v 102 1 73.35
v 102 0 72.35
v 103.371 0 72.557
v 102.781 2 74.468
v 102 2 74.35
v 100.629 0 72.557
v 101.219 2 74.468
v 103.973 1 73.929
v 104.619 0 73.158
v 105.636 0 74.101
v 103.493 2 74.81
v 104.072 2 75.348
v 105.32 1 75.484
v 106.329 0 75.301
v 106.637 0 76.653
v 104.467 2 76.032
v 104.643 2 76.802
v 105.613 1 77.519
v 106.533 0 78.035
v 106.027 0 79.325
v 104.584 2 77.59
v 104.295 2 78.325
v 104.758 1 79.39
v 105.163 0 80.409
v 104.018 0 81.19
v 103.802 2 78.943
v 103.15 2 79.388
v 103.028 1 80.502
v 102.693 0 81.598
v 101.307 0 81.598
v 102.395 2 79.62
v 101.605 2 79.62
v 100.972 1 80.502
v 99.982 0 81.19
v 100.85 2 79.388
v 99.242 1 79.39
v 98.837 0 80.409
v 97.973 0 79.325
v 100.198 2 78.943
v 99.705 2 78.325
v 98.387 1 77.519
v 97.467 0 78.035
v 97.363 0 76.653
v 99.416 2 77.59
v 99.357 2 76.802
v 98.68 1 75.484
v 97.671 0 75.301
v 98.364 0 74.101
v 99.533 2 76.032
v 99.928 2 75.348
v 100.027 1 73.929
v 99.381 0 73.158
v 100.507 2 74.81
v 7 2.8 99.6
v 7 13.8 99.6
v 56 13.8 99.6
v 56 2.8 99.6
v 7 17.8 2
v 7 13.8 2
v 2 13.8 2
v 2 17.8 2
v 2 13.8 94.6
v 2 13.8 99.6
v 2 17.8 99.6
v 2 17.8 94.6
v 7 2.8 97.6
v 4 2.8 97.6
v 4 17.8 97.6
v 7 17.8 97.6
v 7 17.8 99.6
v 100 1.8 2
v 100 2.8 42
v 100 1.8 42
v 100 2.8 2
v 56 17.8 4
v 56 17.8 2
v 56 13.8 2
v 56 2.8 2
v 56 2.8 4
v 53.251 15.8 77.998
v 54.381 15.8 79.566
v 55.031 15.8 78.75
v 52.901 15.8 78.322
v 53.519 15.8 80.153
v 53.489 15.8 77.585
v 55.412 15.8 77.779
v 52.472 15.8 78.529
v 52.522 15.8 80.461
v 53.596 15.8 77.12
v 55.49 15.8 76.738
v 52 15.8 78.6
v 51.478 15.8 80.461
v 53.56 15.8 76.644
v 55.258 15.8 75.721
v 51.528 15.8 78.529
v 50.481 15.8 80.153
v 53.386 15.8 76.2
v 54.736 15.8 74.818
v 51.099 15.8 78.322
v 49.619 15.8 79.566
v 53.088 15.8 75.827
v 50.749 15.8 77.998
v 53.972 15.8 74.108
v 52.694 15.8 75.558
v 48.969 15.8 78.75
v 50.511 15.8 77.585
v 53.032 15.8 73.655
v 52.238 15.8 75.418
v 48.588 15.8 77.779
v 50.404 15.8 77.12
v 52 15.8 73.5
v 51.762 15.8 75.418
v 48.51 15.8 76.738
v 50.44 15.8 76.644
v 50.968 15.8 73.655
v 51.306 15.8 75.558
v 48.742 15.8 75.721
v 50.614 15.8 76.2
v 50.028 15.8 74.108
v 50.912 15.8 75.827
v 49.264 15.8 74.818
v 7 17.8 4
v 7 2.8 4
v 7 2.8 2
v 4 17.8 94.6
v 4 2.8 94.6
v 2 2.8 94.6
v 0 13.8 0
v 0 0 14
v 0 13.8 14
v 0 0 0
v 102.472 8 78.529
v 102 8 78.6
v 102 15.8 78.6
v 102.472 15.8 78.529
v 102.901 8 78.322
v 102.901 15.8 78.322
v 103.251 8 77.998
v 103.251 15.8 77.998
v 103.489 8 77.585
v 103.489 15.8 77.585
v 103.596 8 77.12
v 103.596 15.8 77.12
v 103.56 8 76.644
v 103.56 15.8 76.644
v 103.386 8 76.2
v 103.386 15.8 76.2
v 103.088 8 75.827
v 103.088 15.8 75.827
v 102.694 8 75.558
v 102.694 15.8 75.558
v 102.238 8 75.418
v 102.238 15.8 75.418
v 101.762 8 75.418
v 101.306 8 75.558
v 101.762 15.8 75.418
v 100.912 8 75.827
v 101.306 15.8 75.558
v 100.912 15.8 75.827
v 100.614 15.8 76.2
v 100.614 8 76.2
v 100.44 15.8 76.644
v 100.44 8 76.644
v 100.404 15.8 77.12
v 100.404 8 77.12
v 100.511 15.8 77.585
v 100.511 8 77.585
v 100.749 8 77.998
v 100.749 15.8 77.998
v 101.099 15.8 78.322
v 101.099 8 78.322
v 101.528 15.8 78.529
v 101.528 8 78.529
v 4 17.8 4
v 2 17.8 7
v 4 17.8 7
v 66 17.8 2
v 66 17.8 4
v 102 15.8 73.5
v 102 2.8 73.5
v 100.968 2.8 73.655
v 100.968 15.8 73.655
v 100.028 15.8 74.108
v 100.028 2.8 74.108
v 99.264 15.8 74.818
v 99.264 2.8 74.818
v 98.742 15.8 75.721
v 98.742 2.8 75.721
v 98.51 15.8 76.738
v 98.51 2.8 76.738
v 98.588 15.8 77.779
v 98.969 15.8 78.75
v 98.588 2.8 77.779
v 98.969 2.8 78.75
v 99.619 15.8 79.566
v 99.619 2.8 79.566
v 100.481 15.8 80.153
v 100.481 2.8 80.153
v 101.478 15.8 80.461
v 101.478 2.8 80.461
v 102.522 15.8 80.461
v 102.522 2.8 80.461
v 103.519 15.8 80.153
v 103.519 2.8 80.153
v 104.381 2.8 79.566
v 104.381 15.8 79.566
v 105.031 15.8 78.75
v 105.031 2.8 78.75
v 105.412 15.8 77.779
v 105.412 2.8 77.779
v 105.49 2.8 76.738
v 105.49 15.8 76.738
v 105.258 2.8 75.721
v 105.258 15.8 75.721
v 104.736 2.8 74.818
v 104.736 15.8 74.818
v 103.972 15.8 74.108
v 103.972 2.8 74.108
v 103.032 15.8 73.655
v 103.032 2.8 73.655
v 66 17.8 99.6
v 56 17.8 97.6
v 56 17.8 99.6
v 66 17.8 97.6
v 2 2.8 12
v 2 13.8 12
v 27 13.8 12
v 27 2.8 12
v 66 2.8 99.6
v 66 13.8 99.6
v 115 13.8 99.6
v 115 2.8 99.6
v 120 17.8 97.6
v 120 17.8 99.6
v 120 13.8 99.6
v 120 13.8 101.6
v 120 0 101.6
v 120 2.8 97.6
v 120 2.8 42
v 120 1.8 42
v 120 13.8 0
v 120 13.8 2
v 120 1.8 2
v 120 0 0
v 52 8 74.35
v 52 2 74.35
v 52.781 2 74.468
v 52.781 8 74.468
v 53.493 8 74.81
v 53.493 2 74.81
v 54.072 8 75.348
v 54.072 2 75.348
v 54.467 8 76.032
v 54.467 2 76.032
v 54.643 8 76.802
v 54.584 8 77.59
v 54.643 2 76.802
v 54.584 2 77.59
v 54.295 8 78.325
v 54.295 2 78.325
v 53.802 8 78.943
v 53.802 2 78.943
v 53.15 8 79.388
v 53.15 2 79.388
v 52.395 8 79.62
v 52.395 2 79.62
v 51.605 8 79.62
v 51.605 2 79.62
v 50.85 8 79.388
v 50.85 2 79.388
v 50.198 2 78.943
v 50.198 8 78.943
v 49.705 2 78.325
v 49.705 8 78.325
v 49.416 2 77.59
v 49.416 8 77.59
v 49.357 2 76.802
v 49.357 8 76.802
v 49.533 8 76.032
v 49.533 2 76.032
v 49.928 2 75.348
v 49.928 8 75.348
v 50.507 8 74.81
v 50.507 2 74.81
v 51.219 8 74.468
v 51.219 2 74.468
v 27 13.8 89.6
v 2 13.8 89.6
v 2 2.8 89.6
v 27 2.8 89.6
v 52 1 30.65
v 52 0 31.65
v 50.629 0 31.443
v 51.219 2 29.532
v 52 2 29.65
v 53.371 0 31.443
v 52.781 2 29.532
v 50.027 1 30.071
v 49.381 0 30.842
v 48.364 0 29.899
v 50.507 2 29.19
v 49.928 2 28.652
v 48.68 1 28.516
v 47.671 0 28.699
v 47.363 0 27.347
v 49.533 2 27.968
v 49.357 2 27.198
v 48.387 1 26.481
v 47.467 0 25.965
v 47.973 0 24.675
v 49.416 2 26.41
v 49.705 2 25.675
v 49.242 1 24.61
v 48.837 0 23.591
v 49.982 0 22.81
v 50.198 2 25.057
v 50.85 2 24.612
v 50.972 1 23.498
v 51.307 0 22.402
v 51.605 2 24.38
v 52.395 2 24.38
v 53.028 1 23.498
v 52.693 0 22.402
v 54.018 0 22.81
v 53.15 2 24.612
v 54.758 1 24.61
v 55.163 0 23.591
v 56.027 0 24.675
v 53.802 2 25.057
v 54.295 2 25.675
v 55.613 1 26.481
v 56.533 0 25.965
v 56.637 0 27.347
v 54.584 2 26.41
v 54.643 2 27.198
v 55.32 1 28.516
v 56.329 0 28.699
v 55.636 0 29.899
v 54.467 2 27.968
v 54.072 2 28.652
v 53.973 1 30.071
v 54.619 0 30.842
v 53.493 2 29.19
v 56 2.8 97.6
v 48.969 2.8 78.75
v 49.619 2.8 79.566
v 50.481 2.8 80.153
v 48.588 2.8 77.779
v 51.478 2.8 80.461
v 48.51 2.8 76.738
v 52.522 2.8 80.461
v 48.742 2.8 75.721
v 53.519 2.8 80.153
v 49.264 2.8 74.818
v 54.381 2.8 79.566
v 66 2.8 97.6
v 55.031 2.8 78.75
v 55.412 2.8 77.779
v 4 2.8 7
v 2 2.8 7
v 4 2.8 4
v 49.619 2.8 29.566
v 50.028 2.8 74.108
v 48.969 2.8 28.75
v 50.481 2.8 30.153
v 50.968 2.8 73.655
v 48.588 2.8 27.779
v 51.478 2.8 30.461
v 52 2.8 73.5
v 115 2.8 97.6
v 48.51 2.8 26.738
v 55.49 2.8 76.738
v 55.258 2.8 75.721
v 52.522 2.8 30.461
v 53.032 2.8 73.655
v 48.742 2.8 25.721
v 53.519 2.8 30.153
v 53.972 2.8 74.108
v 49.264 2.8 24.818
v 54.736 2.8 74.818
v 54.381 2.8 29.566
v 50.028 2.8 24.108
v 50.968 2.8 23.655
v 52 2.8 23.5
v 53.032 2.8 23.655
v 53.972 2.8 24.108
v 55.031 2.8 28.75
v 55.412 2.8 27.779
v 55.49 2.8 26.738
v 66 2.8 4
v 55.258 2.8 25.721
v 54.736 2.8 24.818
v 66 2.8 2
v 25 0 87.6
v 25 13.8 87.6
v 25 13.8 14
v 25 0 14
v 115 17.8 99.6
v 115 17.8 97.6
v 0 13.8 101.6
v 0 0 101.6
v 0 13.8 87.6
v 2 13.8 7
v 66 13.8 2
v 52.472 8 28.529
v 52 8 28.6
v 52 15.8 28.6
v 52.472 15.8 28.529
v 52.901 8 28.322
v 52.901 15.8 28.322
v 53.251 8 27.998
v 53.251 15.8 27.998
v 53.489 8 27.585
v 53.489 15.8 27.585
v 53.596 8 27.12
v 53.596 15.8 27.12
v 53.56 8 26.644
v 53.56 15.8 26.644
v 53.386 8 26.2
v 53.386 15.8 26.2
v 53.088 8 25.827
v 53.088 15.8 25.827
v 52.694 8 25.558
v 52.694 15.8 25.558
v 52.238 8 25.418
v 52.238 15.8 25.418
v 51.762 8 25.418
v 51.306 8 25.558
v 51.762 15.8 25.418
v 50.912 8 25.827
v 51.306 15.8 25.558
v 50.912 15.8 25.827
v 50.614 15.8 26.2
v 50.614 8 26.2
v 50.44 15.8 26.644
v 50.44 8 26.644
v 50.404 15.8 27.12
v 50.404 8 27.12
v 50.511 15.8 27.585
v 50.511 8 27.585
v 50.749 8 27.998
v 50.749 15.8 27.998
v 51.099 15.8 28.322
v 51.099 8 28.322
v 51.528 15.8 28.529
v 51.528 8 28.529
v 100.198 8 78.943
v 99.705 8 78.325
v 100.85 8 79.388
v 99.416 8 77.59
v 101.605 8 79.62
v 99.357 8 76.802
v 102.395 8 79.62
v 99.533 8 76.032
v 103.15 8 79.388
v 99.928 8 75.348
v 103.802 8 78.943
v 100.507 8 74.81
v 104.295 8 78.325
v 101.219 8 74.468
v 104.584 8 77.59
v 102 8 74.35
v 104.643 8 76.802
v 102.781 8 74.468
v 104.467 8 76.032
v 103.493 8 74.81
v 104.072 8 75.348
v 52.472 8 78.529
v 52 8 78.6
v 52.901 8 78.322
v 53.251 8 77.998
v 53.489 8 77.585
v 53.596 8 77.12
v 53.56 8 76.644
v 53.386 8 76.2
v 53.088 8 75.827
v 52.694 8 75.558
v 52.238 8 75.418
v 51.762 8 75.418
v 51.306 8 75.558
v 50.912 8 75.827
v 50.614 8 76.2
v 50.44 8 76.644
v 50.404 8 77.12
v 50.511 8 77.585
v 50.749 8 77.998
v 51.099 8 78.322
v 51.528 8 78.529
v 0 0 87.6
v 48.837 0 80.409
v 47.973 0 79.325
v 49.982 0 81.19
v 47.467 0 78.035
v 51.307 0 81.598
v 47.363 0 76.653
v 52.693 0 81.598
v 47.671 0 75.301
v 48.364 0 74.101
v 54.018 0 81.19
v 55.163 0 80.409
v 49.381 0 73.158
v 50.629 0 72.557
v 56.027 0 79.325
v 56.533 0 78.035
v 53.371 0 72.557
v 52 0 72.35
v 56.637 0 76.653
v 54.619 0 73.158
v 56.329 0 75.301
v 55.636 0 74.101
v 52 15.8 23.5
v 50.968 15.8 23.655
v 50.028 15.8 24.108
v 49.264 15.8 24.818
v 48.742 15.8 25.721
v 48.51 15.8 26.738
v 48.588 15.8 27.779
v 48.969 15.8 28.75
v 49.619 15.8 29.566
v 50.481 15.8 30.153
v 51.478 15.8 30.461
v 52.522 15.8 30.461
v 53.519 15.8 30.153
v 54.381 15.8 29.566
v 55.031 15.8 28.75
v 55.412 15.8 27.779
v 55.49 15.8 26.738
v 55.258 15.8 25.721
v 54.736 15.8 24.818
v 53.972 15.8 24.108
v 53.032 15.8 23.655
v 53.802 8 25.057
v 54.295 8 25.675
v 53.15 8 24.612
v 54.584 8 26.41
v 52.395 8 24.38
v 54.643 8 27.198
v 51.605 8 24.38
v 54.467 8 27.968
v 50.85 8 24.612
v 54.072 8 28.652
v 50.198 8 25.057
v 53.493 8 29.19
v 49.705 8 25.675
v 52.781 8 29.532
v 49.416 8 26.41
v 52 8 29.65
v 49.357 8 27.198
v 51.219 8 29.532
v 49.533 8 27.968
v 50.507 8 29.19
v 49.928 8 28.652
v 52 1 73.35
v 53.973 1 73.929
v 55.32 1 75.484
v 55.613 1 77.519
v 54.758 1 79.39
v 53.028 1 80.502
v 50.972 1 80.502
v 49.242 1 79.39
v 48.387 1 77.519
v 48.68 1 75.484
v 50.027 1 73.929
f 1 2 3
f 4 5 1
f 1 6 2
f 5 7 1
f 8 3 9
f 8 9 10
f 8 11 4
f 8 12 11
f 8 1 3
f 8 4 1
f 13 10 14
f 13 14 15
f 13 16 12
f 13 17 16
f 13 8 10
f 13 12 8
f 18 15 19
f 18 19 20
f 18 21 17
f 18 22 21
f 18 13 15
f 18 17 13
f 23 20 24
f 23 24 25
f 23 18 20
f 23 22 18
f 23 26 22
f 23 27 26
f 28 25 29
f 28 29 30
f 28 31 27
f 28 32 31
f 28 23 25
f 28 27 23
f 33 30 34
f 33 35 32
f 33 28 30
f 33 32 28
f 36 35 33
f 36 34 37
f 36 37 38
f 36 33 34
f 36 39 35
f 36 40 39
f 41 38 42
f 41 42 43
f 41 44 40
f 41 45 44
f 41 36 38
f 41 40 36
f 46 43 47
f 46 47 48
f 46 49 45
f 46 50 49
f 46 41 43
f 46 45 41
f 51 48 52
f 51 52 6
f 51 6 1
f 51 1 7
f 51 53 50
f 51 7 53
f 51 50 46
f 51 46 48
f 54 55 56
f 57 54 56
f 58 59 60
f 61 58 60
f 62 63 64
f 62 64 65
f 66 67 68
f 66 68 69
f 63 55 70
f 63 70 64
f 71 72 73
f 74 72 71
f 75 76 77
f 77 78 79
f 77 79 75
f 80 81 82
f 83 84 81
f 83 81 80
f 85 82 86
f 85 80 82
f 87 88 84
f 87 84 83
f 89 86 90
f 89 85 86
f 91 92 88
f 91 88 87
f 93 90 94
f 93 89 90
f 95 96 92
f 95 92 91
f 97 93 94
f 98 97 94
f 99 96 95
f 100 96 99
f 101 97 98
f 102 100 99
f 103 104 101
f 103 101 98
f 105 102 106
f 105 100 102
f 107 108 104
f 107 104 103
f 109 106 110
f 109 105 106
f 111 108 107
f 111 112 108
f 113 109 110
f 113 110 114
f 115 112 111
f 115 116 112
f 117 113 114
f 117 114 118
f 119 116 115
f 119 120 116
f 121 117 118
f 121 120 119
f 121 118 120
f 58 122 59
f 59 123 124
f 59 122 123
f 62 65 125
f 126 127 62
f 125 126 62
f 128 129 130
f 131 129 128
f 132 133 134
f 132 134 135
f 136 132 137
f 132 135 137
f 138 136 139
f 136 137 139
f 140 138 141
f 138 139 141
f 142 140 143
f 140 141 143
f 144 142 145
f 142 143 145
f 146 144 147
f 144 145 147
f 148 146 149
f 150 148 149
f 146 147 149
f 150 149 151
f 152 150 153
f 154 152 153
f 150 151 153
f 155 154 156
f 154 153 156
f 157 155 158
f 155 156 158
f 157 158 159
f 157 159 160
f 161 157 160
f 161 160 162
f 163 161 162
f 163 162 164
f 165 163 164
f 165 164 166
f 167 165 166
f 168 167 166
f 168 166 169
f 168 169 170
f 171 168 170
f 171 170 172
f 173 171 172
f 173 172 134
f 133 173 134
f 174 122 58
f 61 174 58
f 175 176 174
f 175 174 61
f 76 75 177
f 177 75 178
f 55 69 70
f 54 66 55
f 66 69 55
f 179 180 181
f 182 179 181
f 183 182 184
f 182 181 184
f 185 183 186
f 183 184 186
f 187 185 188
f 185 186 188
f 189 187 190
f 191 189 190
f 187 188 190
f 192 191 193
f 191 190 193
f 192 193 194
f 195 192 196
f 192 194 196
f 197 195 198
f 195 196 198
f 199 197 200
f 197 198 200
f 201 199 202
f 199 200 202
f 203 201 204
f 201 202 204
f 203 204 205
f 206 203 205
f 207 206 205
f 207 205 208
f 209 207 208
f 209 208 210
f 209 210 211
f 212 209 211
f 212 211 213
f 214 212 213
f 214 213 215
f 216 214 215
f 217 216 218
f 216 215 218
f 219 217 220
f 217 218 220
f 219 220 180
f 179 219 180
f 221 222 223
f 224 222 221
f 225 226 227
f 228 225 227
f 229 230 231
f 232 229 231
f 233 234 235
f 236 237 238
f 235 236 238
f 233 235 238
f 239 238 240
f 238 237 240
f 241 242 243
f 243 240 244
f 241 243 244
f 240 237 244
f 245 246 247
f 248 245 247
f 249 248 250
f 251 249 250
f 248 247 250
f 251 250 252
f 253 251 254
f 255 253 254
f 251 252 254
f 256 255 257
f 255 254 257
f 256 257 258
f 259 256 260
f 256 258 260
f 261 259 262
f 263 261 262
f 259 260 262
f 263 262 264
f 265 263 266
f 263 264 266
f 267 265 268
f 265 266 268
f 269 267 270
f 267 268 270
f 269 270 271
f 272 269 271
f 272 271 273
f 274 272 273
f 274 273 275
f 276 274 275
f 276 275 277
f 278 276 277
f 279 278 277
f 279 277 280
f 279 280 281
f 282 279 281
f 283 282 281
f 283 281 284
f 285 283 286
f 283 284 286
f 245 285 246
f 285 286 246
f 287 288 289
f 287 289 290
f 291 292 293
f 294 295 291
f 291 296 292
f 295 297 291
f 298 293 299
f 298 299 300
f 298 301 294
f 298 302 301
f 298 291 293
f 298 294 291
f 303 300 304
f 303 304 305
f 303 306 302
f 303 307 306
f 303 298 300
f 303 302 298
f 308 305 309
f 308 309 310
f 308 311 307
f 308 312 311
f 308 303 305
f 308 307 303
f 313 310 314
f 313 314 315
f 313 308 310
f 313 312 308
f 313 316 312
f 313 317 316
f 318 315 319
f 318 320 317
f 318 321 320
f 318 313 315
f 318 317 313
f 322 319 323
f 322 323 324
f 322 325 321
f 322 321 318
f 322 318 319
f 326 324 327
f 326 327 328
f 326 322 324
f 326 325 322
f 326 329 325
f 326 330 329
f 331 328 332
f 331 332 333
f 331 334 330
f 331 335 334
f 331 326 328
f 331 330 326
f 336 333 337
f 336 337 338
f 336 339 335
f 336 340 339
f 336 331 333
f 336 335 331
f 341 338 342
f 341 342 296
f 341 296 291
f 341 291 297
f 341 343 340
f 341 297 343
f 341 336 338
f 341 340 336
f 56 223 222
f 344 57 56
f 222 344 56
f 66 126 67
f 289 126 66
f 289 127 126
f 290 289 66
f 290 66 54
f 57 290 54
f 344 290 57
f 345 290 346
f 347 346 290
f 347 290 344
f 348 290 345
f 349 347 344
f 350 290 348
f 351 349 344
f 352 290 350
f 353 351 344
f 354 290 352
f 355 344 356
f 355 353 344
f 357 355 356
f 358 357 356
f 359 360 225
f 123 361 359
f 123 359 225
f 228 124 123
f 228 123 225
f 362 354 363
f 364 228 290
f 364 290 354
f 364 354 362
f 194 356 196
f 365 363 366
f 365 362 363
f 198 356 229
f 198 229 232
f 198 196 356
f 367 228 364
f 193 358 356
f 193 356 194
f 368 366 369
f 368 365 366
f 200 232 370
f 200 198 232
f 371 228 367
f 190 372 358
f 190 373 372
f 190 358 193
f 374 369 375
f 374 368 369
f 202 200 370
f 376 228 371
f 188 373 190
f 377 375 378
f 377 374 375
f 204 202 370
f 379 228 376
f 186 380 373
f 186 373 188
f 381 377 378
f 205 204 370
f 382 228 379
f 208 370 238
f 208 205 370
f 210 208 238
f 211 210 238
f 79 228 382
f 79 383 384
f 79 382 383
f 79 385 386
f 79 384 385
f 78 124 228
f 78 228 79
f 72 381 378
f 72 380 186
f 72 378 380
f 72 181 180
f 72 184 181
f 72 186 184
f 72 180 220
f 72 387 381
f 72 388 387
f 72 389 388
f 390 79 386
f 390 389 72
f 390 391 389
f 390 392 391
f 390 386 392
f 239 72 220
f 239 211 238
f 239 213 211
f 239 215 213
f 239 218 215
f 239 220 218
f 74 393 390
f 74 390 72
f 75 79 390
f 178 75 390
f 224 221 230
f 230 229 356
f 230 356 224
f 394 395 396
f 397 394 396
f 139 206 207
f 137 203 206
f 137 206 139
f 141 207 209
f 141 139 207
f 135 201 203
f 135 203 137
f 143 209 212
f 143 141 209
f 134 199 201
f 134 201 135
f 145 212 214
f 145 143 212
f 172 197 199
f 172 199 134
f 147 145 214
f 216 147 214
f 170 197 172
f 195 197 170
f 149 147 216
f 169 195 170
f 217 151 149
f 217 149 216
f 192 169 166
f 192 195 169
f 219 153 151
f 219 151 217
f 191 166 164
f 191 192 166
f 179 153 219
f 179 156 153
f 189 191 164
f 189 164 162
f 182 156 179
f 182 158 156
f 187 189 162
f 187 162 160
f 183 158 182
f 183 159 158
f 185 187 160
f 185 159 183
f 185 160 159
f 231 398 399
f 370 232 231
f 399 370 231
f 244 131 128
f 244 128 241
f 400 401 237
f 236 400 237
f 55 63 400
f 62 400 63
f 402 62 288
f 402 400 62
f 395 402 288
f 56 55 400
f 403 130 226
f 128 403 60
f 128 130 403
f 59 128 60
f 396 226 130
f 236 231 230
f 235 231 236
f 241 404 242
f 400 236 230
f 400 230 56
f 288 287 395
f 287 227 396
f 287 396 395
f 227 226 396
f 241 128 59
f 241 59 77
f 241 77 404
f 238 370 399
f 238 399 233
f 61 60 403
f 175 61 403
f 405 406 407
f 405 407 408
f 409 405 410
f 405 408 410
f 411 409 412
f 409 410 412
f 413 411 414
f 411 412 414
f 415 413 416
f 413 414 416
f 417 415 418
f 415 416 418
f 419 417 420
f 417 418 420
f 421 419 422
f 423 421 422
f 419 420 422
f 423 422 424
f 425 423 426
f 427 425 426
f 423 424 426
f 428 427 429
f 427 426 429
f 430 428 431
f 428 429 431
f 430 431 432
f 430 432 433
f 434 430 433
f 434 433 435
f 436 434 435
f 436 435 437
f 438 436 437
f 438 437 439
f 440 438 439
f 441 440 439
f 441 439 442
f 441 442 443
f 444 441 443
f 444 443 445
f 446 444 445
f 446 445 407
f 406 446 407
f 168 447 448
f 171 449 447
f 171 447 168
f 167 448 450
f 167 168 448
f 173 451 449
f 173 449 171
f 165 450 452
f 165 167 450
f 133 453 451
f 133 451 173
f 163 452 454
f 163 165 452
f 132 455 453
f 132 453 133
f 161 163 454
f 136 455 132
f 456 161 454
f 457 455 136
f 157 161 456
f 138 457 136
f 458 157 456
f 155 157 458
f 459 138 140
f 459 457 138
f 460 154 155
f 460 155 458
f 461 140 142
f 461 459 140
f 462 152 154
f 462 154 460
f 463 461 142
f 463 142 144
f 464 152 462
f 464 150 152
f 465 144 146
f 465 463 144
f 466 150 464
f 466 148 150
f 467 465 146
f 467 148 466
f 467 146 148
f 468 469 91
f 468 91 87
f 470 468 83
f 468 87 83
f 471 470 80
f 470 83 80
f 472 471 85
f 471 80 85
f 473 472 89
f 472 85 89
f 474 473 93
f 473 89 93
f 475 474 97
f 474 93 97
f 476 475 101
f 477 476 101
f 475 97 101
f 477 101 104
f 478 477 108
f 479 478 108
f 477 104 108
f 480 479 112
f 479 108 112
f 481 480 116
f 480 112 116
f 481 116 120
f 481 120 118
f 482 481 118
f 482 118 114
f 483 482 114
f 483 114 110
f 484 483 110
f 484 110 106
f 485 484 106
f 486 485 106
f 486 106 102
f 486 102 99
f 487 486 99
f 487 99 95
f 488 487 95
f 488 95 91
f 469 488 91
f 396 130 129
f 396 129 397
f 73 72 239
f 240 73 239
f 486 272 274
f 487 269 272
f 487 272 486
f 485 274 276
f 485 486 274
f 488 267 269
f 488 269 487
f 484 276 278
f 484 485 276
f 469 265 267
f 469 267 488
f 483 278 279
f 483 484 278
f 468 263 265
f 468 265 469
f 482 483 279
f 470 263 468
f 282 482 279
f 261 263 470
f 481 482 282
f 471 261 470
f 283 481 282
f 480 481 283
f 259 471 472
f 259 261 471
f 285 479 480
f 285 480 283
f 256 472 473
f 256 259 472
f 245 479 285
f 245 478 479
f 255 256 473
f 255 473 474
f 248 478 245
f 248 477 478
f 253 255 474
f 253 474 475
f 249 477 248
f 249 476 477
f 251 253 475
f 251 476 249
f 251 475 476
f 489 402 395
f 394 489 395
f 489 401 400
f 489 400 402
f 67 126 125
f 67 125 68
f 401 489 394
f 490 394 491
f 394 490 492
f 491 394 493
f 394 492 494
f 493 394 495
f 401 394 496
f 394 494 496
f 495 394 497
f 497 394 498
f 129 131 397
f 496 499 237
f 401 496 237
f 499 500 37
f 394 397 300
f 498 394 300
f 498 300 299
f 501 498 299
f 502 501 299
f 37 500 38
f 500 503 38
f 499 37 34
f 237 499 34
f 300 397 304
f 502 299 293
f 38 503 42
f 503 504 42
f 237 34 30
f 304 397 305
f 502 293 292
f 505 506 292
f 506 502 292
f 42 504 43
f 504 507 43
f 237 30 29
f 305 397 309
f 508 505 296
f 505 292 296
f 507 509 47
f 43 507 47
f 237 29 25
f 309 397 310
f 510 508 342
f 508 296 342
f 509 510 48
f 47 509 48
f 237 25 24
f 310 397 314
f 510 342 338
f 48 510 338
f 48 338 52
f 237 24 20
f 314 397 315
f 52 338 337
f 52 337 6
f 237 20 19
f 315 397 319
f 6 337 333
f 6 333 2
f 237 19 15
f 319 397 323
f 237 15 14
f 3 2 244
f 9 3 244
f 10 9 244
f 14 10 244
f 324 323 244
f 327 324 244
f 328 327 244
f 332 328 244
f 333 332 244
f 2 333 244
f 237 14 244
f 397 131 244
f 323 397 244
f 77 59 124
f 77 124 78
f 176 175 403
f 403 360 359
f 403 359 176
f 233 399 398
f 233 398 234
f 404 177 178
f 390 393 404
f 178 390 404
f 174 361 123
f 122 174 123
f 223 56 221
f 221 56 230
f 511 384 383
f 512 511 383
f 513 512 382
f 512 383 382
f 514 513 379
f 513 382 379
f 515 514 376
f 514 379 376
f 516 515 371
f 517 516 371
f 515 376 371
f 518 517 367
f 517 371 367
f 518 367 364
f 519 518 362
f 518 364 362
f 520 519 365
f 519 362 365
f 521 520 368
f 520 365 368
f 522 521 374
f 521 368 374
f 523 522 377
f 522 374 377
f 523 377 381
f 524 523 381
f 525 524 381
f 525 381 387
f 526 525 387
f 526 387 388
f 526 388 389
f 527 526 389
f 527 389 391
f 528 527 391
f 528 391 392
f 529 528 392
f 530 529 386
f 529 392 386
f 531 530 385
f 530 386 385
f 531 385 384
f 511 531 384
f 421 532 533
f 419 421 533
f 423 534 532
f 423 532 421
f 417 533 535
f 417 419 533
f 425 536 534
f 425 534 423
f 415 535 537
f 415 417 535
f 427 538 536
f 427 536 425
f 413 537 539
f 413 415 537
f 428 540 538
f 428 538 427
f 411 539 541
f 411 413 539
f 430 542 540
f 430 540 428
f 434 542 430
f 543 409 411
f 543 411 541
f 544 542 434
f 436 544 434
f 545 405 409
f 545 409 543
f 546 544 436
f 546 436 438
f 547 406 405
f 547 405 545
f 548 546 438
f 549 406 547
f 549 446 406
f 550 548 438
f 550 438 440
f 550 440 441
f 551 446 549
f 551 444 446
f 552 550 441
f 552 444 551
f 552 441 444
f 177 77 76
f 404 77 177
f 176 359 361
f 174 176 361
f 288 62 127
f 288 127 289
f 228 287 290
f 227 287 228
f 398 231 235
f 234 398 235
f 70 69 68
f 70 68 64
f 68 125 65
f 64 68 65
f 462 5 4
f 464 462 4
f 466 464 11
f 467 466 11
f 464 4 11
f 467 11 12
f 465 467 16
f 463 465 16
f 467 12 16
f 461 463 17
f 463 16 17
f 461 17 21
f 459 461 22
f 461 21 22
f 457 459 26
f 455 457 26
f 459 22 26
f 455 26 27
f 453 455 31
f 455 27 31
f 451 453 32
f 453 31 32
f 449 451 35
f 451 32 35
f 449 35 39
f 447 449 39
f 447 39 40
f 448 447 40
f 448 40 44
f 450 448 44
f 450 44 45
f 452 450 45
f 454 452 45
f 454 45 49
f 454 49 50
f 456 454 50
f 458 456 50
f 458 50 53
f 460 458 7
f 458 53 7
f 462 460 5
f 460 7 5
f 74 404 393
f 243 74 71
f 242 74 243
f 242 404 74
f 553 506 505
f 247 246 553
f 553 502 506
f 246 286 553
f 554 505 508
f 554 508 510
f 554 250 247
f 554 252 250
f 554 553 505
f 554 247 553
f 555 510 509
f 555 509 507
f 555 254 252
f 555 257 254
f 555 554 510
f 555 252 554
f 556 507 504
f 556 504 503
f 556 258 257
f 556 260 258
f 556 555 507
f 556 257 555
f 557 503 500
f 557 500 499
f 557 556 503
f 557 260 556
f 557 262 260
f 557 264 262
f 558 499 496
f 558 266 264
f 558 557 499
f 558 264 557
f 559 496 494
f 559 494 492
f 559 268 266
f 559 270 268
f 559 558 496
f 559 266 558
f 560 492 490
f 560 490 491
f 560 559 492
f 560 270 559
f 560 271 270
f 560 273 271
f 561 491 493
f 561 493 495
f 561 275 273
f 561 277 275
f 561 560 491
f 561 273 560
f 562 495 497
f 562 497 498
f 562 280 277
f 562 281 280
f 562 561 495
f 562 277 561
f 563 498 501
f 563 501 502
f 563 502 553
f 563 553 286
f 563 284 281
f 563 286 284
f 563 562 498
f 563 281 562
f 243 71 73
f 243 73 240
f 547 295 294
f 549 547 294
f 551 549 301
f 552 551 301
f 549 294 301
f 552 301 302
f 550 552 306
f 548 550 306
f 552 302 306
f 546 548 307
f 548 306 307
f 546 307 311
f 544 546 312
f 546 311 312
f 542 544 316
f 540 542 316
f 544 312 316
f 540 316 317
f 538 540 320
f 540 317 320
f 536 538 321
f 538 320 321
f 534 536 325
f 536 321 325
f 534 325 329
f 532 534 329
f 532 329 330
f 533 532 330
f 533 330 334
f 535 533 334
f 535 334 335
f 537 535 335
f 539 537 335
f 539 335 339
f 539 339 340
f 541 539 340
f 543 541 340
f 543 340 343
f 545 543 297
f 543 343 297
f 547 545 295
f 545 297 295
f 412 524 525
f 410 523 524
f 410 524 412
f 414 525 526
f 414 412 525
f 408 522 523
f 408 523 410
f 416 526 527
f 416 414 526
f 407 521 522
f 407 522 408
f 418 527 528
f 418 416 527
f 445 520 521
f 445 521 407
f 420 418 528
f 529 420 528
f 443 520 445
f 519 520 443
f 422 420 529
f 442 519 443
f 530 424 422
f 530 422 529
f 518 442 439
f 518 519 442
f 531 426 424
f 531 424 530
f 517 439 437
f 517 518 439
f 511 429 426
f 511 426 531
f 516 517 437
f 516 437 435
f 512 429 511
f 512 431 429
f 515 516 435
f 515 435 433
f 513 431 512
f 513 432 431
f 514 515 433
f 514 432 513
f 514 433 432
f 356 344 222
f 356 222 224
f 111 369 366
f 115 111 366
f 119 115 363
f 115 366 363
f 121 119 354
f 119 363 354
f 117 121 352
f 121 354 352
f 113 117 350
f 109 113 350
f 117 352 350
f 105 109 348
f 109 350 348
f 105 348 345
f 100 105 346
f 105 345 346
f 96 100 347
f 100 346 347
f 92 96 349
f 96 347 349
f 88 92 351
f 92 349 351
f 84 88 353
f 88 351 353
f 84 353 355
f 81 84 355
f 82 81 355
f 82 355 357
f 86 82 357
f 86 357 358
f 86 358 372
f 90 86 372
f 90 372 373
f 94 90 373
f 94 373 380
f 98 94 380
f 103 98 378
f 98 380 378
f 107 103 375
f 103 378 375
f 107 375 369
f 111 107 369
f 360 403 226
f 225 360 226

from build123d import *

# Parameters (mm, degrees)
SKETCH_1_W           = 120
SKETCH_1_H           = 101.6
EXTRUDE_1_DEPTH      = 13.8
CUT_EXTRUDE_1_REACH  = 159.839
SKETCH_2_W           = 25
SKETCH_2_H           = 73.6
SKETCH_4_W           = 93
SKETCH_4_H           = 97.6
CUT_EXTRUDE_2_DEPTH  = 11
SKETCH_6_W           = 25
SKETCH_6_H           = 10
CUT_EXTRUDE_3_DEPTH  = 11
SKETCH_7_W           = 5
SKETCH_7_H           = 2
SKETCH_7_W_2         = 10
EXTRUDE_2_DEPTH      = 15
SKETCH_14_W          = 20
SKETCH_14_H          = 40
CUT_EXTRUDE_9_DEPTH  = 16
SKETCH_15_R          = 3.5
EXTRUDE_3_DEPTH      = 13
CUT_EXTRUDE_10_REACH = 160.026
SKETCH_16_R          = 1.6
SKETCH_17_R          = 2.65
CUT_EXTRUDE_11_DEPTH = 8
CHAMFER_1_SIZE       = 2


with BuildPart() as part:
    # 草图1 → 凸台-拉伸1 (new body)
    with BuildSketch(Plane(origin=(0, 0, 0), x_dir=(1, 0, 0), z_dir=(0, 1, 0))):
        with Locations((60, -50.8)):
            Rectangle(SKETCH_1_W, SKETCH_1_H)
    extrude(amount=EXTRUDE_1_DEPTH)

    # 草图2 → 切除-拉伸1 (cut, up to next)
    with BuildSketch(Plane(origin=(0, 13.8, 0), x_dir=(1, 0, 0), z_dir=(0, 1, 0)), mode=Mode.PRIVATE) as cut_extrude_1_sk1:
        with Locations((12.5, -50.8)):
            Rectangle(SKETCH_2_W, SKETCH_2_H)
    cut_extrude_1_tool1 = extrude(cut_extrude_1_sk1.sketch, amount=-CUT_EXTRUDE_1_REACH, mode=Mode.PRIVATE) & part.part
    add(cut_extrude_1_tool1.solids().sort_by_distance((12.5, 13.8, 50.8))[0], mode=Mode.SUBTRACT)

    # 草图4 → 切除-拉伸2 (cut)
    with BuildSketch(Plane(origin=(0, 13.8, 0), x_dir=(1, 0, 0), z_dir=(0, 1, 0))):
        with Locations((73.5, -50.8)):
            Rectangle(SKETCH_4_W, SKETCH_4_H)
    extrude(amount=-CUT_EXTRUDE_2_DEPTH, mode=Mode.SUBTRACT)

    # 草图6 → 切除-拉伸3 (cut)
    with BuildSketch(Plane(origin=(0, 13.8, 0), x_dir=(1, 0, 0), z_dir=(0, 1, 0))):
        with Locations((14.5, -94.6)):
            Rectangle(SKETCH_6_W, SKETCH_6_H)
    cut_extrude_3 = extrude(amount=-CUT_EXTRUDE_3_DEPTH, mode=Mode.SUBTRACT)

    # 镜向1: 切除-拉伸3 across plane
    add(cut_extrude_3.mirror(Plane(origin=(0, 0, 50.8), x_dir=(1, 0, 0), z_dir=(0, 0, -1))), mode=Mode.SUBTRACT)

    # 草图7 → 凸台-拉伸2 (add)
    with BuildSketch(Plane(origin=(0, 2.8, 0), x_dir=(1, 0, 0), z_dir=(0, 1, 0))):
        Polygon((2, -94.6), (4, -94.6), (4, -97.6), (7, -97.6), (7, -99.6), (2, -99.6), align=None)
        with Locations((117.5, -98.6)):
            Rectangle(SKETCH_7_W, SKETCH_7_H)
        with Locations((61, -98.6)):
            Rectangle(SKETCH_7_W_2, SKETCH_7_H)
    extrude_2 = extrude(amount=EXTRUDE_2_DEPTH)

    # 镜向2: 凸台-拉伸2 across plane
    add(extrude_2.mirror(Plane(origin=(0, 0, 50.8), x_dir=(1, 0, 0), z_dir=(0, 0, -1))))

    # 草图14 → 切除-拉伸9 (cut)
    with BuildSketch(Plane(origin=(0, 17.8, 0), x_dir=(1, 0, 0), z_dir=(0, 1, 0))):
        with Locations((110, -22)):
            Rectangle(SKETCH_14_W, SKETCH_14_H)
    extrude(amount=-CUT_EXTRUDE_9_DEPTH, mode=Mode.SUBTRACT)

    # 草图15 → 凸台-拉伸3 (add)
    with BuildSketch(Plane(origin=(0, 2.8, 0), x_dir=(1, 0, 0), z_dir=(0, 1, 0))):
        with Locations(Location((52, -27, 0), (0, 0, 90))):
            Circle(SKETCH_15_R)
        with Locations(Location((52, -77, 0), (0, 0, 90))):
            Circle(SKETCH_15_R)
        with Locations(Location((102, -77, 0), (0, 0, 90))):
            Circle(SKETCH_15_R)
    extrude(amount=EXTRUDE_3_DEPTH)

    # 草图16 → 切除-拉伸10 (cut, up to next)
    with BuildSketch(Plane(origin=(0, 15.8, 0), x_dir=(1, 0, 0), z_dir=(0, 1, 0)), mode=Mode.PRIVATE) as cut_extrude_10_sk1:
        with Locations(Location((52, -27, 0), (0, 0, 270))):
            Circle(SKETCH_16_R)
    cut_extrude_10_tool1 = extrude(cut_extrude_10_sk1.sketch, amount=-CUT_EXTRUDE_10_REACH, mode=Mode.PRIVATE) & part.part
    # 草图16 → 切除-拉伸10 (cut, up to next)
    with BuildSketch(Plane(origin=(0, 15.8, 0), x_dir=(1, 0, 0), z_dir=(0, 1, 0)), mode=Mode.PRIVATE) as cut_extrude_10_sk2:
        with Locations(Location((52, -77, 0), (0, 0, 270))):
            Circle(SKETCH_16_R)
    cut_extrude_10_tool2 = extrude(cut_extrude_10_sk2.sketch, amount=-CUT_EXTRUDE_10_REACH, mode=Mode.PRIVATE) & part.part
    # 草图16 → 切除-拉伸10 (cut, up to next)
    with BuildSketch(Plane(origin=(0, 15.8, 0), x_dir=(1, 0, 0), z_dir=(0, 1, 0)), mode=Mode.PRIVATE) as cut_extrude_10_sk3:
        with Locations(Location((102, -77, 0), (0, 0, 270))):
            Circle(SKETCH_16_R)
    cut_extrude_10_tool3 = extrude(cut_extrude_10_sk3.sketch, amount=-CUT_EXTRUDE_10_REACH, mode=Mode.PRIVATE) & part.part
    add(cut_extrude_10_tool1.solids().sort_by_distance((52, 15.8, 27))[0], mode=Mode.SUBTRACT)
    add(cut_extrude_10_tool2.solids().sort_by_distance((52, 15.8, 77))[0], mode=Mode.SUBTRACT)
    add(cut_extrude_10_tool3.solids().sort_by_distance((102, 15.8, 77))[0], mode=Mode.SUBTRACT)

    # 草图17 → 切除-拉伸11 (cut)
    with BuildSketch(Plane.XZ):
        with Locations(Location((52, 77, 0), (0, 0, 270))):
            Circle(SKETCH_17_R)
        with Locations(Location((52, 27, 0), (0, 0, 90))):
            Circle(SKETCH_17_R)
        with Locations(Location((102, 77, 0), (0, 0, 270))):
            Circle(SKETCH_17_R)
    extrude(amount=-CUT_EXTRUDE_11_DEPTH, mode=Mode.SUBTRACT)

    # 倒角1
    chamfer_1_edges = [part.edges().sort_by_distance(p)[0] for p in [
        (102, 0, 79.65),
        (52, 0, 24.35),
        (52, 0, 79.65),
    ]]
    chamfer(chamfer_1_edges, length=CHAMFER_1_SIZE)


solid = part.part
